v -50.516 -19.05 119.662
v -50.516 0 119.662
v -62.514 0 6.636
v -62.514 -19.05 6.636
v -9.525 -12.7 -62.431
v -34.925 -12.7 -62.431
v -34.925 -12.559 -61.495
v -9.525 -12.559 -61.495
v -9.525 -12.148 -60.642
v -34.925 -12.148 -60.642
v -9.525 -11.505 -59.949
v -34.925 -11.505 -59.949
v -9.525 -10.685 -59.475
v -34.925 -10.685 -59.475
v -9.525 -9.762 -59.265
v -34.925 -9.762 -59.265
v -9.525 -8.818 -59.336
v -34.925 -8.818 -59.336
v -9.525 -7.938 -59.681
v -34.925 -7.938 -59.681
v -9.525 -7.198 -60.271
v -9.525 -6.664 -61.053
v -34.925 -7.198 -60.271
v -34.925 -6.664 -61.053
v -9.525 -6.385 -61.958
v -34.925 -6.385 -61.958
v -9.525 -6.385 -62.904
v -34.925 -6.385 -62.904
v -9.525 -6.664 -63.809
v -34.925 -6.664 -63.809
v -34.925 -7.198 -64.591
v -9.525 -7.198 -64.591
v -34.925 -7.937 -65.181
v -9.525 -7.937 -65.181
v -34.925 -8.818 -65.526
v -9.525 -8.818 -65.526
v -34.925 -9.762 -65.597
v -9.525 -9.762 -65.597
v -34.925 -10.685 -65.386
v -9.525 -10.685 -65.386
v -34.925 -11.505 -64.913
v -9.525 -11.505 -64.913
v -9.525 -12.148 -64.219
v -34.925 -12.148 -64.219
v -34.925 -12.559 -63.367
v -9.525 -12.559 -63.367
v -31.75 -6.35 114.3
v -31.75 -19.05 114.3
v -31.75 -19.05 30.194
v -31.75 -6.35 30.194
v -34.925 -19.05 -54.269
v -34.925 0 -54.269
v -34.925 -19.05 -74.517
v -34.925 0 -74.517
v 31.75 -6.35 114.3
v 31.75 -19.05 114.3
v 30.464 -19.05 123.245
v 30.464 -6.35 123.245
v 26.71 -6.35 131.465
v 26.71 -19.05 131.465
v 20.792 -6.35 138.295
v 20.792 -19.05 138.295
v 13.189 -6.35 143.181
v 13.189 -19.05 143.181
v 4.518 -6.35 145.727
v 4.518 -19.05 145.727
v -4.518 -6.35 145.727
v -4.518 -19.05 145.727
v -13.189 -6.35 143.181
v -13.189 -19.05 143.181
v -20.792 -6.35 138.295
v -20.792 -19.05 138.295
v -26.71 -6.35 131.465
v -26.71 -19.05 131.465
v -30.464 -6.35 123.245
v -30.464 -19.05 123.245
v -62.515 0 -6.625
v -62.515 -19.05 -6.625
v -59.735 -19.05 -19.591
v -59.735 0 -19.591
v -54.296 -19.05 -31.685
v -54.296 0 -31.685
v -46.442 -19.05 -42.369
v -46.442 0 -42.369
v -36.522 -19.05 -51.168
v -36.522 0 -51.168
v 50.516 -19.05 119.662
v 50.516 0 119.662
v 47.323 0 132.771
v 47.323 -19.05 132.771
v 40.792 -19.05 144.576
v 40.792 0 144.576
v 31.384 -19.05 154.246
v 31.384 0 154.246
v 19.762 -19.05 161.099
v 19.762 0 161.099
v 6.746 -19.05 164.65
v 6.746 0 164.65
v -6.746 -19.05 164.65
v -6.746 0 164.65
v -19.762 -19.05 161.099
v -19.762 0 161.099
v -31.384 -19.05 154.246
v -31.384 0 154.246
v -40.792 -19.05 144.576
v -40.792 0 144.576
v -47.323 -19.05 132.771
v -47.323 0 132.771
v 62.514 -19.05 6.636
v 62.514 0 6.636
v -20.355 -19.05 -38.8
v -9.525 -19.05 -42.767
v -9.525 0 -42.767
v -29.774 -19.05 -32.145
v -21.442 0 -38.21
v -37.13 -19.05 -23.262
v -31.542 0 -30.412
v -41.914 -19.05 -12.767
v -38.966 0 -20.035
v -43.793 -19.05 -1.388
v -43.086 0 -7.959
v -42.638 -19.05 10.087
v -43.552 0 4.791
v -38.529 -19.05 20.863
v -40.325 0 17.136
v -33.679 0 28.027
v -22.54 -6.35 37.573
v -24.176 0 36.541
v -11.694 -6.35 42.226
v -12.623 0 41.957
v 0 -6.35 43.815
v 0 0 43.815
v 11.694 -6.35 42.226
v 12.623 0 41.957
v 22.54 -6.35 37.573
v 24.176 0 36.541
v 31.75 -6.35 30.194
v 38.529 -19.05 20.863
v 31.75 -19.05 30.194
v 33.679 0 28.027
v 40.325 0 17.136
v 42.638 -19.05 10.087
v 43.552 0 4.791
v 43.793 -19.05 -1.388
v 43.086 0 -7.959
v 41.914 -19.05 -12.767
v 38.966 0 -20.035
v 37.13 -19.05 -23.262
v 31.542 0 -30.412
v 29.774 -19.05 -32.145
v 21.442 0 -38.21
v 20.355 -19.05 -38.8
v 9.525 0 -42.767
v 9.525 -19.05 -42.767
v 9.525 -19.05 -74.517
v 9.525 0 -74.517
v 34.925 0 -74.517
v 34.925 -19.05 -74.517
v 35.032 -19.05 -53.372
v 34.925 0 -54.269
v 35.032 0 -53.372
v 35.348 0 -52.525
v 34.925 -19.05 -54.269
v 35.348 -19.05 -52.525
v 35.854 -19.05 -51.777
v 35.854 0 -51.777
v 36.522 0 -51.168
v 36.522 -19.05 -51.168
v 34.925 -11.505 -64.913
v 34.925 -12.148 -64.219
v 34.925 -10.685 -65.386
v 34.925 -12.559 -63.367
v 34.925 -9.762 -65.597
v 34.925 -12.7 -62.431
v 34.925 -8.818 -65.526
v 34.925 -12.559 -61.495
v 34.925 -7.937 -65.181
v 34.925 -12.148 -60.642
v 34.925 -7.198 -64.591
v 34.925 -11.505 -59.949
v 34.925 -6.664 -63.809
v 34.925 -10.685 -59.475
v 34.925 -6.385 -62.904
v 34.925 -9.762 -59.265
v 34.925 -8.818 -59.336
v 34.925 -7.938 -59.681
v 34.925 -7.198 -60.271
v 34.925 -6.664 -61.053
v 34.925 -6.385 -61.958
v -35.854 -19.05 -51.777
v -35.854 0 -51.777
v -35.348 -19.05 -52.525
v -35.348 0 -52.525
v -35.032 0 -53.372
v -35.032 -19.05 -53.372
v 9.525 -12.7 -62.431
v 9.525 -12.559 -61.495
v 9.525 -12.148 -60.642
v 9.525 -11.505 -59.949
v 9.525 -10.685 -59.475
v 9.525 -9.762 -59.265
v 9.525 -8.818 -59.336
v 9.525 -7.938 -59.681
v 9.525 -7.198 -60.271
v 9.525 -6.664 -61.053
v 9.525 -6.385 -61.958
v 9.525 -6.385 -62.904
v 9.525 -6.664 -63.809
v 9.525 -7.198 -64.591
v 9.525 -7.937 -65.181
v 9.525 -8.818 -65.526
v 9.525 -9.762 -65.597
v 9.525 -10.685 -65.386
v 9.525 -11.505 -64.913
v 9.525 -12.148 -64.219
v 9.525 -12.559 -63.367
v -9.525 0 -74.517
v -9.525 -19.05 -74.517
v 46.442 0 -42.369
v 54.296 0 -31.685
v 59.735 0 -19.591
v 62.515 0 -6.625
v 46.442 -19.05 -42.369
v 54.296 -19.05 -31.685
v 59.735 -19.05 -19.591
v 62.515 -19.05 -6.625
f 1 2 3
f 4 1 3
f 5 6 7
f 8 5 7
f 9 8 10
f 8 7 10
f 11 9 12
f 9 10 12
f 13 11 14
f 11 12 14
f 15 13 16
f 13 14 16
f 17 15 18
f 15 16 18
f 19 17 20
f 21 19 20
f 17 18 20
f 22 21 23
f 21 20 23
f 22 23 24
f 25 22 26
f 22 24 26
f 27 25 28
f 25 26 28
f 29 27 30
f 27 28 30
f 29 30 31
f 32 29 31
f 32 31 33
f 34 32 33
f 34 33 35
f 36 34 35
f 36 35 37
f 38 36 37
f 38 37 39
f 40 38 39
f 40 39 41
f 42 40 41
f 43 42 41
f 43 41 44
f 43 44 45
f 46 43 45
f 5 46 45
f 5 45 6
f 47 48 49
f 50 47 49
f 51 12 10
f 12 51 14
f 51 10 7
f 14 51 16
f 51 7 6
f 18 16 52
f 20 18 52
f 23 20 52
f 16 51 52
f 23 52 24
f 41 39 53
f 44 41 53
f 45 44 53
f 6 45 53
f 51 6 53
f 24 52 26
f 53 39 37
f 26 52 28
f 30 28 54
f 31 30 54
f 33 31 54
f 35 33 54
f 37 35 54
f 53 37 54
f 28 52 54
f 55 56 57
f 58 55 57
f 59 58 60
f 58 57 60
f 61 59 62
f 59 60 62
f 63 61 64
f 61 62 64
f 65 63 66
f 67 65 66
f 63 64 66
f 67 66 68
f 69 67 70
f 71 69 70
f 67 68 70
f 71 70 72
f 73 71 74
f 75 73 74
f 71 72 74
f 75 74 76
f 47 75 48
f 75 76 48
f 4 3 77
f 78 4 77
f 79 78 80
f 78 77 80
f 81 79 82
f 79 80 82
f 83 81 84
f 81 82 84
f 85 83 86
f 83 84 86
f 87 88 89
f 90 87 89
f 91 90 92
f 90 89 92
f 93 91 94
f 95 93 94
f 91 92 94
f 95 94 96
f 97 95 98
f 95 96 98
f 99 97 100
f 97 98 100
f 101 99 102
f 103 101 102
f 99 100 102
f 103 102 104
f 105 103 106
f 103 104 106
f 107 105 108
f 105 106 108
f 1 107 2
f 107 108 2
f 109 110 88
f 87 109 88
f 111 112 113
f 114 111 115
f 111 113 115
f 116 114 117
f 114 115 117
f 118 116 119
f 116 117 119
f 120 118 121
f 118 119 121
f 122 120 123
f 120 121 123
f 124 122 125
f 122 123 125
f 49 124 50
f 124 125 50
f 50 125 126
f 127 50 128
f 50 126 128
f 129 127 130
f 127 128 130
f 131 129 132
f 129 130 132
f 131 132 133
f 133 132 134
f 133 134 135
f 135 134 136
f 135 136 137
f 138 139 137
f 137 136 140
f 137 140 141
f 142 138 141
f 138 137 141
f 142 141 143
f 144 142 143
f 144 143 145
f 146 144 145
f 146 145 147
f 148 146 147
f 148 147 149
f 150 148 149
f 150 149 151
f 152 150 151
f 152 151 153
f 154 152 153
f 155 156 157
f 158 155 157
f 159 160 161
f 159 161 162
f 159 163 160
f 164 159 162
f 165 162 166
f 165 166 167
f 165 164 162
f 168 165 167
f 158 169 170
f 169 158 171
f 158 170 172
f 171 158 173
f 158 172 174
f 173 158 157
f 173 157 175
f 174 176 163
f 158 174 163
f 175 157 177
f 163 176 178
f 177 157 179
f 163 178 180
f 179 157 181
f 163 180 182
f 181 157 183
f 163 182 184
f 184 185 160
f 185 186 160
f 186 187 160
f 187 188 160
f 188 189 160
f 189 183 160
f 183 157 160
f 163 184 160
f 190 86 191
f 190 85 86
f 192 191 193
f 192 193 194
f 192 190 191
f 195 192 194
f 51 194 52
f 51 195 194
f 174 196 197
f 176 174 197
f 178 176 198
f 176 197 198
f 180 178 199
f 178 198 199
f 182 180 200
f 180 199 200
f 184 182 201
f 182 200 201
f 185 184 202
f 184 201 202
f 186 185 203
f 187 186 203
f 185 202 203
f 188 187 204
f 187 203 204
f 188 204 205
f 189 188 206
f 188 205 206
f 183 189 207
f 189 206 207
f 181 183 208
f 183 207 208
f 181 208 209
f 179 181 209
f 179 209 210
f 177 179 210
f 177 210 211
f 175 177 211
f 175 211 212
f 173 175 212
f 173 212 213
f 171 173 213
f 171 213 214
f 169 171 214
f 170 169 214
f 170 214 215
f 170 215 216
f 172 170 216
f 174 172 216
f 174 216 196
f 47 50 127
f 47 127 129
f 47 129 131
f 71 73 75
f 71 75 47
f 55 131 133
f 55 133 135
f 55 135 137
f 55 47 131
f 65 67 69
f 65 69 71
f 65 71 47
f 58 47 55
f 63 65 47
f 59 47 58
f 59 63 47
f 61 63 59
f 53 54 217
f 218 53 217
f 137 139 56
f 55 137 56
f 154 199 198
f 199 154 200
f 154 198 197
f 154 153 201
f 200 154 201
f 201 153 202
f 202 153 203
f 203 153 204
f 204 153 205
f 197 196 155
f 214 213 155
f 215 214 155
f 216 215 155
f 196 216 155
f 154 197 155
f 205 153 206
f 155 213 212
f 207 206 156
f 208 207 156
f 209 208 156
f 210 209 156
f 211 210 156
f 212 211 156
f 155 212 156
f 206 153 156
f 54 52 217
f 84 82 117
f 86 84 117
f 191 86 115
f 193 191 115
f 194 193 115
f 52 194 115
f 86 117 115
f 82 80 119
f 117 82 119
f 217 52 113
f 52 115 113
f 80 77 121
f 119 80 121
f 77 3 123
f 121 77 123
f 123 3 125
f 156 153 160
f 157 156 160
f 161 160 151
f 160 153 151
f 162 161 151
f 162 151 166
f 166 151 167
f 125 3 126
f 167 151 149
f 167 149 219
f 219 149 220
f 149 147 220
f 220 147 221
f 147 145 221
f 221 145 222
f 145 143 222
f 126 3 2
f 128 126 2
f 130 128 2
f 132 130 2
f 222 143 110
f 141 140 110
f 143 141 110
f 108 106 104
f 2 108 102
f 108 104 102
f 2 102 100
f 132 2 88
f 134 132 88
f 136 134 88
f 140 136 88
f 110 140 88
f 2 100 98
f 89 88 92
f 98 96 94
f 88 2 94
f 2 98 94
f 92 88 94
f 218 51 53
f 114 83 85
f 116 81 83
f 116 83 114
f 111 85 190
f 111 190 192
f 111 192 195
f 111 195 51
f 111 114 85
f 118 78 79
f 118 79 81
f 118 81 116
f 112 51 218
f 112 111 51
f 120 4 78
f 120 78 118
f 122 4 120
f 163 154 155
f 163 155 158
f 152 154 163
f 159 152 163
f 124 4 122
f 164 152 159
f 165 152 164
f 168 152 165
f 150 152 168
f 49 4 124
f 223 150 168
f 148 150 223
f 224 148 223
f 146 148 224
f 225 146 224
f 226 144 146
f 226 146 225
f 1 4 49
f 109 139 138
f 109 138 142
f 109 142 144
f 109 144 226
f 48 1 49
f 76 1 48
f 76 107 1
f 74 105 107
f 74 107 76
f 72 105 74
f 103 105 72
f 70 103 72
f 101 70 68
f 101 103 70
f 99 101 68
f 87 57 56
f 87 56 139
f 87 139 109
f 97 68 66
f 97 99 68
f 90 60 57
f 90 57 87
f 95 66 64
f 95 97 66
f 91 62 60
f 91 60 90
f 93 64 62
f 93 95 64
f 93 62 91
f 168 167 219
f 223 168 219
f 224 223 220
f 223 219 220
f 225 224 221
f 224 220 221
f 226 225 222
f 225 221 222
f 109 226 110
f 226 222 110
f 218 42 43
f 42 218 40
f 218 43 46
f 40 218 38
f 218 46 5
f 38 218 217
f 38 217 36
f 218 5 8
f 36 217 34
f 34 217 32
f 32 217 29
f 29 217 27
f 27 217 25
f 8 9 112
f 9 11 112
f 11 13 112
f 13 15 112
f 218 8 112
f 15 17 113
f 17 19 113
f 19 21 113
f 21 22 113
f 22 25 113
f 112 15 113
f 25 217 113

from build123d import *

# Parameters (mm, degrees)
F1_DEPTH = 19.05
F3_DEPTH = 12.7
F5_D     = 6.35
F6_R     = 3.81


with BuildPart() as f1:
    # F0 (on Front) → F1 (new body)
    with BuildSketch(Plane.XZ):
        with BuildLine():
            ThreePointArc((-9.525, -42.767144), (0, 43.815), (9.525, -42.767144))
            Line((9.525, -42.767144), (9.525, -74.517144))
            Line((9.525, -74.517144), (34.925, -74.517144))
            Line((34.925, -74.517144), (34.925, -52.270954))
            ThreePointArc((34.925, -52.270954), (56.930482, -26.663241), (62.513799, 6.63575))
            Line((62.513799, 6.63575), (50.516201, 119.662222))
            ThreePointArc((50.516201, 119.662222), (0, 165.1), (-50.516201, 119.662222))
            Line((-50.516201, 119.662222), (-62.513799, 6.63575))
            ThreePointArc((-62.513799, 6.63575), (-56.930482, -26.663241), (-34.925, -52.270954))
            Line((-34.925, -52.270954), (-34.925, -74.517144))
            Line((-34.925, -74.517144), (-9.525, -74.517144))
            Line((-9.525, -74.517144), (-9.525, -42.767144))
        make_face()
    extrude(amount=F1_DEPTH)

    # F2 (on face) → F3 (cut)
    with BuildSketch(Plane.XZ.offset(19.05)):
        with BuildLine():
            Line((31.75, 12.7), (31.75, 114.3))
            ThreePointArc((31.75, 114.3), (0, 146.05), (-31.75, 114.3))
            Line((-31.75, 114.3), (-31.75, 12.7))
            Line((-31.75, 12.7), (31.75, 12.7))
        make_face()
    extrude(amount=-F3_DEPTH, mode=Mode.SUBTRACT)

    # F5 (through all)
    with Locations(Plane.YZ.offset(34.925)):
        with Locations((-9.525, -62.430954)):
            Hole(F5_D / 2)

    # F6
    f6_edges = [f1.edges().sort_by_distance(p)[0] for p in [
        (34.925, -9.525, -52.270954),
        (-34.925, -9.525, -52.270954),
    ]]
    fillet(f6_edges, radius=F6_R)


solid = f1.part
